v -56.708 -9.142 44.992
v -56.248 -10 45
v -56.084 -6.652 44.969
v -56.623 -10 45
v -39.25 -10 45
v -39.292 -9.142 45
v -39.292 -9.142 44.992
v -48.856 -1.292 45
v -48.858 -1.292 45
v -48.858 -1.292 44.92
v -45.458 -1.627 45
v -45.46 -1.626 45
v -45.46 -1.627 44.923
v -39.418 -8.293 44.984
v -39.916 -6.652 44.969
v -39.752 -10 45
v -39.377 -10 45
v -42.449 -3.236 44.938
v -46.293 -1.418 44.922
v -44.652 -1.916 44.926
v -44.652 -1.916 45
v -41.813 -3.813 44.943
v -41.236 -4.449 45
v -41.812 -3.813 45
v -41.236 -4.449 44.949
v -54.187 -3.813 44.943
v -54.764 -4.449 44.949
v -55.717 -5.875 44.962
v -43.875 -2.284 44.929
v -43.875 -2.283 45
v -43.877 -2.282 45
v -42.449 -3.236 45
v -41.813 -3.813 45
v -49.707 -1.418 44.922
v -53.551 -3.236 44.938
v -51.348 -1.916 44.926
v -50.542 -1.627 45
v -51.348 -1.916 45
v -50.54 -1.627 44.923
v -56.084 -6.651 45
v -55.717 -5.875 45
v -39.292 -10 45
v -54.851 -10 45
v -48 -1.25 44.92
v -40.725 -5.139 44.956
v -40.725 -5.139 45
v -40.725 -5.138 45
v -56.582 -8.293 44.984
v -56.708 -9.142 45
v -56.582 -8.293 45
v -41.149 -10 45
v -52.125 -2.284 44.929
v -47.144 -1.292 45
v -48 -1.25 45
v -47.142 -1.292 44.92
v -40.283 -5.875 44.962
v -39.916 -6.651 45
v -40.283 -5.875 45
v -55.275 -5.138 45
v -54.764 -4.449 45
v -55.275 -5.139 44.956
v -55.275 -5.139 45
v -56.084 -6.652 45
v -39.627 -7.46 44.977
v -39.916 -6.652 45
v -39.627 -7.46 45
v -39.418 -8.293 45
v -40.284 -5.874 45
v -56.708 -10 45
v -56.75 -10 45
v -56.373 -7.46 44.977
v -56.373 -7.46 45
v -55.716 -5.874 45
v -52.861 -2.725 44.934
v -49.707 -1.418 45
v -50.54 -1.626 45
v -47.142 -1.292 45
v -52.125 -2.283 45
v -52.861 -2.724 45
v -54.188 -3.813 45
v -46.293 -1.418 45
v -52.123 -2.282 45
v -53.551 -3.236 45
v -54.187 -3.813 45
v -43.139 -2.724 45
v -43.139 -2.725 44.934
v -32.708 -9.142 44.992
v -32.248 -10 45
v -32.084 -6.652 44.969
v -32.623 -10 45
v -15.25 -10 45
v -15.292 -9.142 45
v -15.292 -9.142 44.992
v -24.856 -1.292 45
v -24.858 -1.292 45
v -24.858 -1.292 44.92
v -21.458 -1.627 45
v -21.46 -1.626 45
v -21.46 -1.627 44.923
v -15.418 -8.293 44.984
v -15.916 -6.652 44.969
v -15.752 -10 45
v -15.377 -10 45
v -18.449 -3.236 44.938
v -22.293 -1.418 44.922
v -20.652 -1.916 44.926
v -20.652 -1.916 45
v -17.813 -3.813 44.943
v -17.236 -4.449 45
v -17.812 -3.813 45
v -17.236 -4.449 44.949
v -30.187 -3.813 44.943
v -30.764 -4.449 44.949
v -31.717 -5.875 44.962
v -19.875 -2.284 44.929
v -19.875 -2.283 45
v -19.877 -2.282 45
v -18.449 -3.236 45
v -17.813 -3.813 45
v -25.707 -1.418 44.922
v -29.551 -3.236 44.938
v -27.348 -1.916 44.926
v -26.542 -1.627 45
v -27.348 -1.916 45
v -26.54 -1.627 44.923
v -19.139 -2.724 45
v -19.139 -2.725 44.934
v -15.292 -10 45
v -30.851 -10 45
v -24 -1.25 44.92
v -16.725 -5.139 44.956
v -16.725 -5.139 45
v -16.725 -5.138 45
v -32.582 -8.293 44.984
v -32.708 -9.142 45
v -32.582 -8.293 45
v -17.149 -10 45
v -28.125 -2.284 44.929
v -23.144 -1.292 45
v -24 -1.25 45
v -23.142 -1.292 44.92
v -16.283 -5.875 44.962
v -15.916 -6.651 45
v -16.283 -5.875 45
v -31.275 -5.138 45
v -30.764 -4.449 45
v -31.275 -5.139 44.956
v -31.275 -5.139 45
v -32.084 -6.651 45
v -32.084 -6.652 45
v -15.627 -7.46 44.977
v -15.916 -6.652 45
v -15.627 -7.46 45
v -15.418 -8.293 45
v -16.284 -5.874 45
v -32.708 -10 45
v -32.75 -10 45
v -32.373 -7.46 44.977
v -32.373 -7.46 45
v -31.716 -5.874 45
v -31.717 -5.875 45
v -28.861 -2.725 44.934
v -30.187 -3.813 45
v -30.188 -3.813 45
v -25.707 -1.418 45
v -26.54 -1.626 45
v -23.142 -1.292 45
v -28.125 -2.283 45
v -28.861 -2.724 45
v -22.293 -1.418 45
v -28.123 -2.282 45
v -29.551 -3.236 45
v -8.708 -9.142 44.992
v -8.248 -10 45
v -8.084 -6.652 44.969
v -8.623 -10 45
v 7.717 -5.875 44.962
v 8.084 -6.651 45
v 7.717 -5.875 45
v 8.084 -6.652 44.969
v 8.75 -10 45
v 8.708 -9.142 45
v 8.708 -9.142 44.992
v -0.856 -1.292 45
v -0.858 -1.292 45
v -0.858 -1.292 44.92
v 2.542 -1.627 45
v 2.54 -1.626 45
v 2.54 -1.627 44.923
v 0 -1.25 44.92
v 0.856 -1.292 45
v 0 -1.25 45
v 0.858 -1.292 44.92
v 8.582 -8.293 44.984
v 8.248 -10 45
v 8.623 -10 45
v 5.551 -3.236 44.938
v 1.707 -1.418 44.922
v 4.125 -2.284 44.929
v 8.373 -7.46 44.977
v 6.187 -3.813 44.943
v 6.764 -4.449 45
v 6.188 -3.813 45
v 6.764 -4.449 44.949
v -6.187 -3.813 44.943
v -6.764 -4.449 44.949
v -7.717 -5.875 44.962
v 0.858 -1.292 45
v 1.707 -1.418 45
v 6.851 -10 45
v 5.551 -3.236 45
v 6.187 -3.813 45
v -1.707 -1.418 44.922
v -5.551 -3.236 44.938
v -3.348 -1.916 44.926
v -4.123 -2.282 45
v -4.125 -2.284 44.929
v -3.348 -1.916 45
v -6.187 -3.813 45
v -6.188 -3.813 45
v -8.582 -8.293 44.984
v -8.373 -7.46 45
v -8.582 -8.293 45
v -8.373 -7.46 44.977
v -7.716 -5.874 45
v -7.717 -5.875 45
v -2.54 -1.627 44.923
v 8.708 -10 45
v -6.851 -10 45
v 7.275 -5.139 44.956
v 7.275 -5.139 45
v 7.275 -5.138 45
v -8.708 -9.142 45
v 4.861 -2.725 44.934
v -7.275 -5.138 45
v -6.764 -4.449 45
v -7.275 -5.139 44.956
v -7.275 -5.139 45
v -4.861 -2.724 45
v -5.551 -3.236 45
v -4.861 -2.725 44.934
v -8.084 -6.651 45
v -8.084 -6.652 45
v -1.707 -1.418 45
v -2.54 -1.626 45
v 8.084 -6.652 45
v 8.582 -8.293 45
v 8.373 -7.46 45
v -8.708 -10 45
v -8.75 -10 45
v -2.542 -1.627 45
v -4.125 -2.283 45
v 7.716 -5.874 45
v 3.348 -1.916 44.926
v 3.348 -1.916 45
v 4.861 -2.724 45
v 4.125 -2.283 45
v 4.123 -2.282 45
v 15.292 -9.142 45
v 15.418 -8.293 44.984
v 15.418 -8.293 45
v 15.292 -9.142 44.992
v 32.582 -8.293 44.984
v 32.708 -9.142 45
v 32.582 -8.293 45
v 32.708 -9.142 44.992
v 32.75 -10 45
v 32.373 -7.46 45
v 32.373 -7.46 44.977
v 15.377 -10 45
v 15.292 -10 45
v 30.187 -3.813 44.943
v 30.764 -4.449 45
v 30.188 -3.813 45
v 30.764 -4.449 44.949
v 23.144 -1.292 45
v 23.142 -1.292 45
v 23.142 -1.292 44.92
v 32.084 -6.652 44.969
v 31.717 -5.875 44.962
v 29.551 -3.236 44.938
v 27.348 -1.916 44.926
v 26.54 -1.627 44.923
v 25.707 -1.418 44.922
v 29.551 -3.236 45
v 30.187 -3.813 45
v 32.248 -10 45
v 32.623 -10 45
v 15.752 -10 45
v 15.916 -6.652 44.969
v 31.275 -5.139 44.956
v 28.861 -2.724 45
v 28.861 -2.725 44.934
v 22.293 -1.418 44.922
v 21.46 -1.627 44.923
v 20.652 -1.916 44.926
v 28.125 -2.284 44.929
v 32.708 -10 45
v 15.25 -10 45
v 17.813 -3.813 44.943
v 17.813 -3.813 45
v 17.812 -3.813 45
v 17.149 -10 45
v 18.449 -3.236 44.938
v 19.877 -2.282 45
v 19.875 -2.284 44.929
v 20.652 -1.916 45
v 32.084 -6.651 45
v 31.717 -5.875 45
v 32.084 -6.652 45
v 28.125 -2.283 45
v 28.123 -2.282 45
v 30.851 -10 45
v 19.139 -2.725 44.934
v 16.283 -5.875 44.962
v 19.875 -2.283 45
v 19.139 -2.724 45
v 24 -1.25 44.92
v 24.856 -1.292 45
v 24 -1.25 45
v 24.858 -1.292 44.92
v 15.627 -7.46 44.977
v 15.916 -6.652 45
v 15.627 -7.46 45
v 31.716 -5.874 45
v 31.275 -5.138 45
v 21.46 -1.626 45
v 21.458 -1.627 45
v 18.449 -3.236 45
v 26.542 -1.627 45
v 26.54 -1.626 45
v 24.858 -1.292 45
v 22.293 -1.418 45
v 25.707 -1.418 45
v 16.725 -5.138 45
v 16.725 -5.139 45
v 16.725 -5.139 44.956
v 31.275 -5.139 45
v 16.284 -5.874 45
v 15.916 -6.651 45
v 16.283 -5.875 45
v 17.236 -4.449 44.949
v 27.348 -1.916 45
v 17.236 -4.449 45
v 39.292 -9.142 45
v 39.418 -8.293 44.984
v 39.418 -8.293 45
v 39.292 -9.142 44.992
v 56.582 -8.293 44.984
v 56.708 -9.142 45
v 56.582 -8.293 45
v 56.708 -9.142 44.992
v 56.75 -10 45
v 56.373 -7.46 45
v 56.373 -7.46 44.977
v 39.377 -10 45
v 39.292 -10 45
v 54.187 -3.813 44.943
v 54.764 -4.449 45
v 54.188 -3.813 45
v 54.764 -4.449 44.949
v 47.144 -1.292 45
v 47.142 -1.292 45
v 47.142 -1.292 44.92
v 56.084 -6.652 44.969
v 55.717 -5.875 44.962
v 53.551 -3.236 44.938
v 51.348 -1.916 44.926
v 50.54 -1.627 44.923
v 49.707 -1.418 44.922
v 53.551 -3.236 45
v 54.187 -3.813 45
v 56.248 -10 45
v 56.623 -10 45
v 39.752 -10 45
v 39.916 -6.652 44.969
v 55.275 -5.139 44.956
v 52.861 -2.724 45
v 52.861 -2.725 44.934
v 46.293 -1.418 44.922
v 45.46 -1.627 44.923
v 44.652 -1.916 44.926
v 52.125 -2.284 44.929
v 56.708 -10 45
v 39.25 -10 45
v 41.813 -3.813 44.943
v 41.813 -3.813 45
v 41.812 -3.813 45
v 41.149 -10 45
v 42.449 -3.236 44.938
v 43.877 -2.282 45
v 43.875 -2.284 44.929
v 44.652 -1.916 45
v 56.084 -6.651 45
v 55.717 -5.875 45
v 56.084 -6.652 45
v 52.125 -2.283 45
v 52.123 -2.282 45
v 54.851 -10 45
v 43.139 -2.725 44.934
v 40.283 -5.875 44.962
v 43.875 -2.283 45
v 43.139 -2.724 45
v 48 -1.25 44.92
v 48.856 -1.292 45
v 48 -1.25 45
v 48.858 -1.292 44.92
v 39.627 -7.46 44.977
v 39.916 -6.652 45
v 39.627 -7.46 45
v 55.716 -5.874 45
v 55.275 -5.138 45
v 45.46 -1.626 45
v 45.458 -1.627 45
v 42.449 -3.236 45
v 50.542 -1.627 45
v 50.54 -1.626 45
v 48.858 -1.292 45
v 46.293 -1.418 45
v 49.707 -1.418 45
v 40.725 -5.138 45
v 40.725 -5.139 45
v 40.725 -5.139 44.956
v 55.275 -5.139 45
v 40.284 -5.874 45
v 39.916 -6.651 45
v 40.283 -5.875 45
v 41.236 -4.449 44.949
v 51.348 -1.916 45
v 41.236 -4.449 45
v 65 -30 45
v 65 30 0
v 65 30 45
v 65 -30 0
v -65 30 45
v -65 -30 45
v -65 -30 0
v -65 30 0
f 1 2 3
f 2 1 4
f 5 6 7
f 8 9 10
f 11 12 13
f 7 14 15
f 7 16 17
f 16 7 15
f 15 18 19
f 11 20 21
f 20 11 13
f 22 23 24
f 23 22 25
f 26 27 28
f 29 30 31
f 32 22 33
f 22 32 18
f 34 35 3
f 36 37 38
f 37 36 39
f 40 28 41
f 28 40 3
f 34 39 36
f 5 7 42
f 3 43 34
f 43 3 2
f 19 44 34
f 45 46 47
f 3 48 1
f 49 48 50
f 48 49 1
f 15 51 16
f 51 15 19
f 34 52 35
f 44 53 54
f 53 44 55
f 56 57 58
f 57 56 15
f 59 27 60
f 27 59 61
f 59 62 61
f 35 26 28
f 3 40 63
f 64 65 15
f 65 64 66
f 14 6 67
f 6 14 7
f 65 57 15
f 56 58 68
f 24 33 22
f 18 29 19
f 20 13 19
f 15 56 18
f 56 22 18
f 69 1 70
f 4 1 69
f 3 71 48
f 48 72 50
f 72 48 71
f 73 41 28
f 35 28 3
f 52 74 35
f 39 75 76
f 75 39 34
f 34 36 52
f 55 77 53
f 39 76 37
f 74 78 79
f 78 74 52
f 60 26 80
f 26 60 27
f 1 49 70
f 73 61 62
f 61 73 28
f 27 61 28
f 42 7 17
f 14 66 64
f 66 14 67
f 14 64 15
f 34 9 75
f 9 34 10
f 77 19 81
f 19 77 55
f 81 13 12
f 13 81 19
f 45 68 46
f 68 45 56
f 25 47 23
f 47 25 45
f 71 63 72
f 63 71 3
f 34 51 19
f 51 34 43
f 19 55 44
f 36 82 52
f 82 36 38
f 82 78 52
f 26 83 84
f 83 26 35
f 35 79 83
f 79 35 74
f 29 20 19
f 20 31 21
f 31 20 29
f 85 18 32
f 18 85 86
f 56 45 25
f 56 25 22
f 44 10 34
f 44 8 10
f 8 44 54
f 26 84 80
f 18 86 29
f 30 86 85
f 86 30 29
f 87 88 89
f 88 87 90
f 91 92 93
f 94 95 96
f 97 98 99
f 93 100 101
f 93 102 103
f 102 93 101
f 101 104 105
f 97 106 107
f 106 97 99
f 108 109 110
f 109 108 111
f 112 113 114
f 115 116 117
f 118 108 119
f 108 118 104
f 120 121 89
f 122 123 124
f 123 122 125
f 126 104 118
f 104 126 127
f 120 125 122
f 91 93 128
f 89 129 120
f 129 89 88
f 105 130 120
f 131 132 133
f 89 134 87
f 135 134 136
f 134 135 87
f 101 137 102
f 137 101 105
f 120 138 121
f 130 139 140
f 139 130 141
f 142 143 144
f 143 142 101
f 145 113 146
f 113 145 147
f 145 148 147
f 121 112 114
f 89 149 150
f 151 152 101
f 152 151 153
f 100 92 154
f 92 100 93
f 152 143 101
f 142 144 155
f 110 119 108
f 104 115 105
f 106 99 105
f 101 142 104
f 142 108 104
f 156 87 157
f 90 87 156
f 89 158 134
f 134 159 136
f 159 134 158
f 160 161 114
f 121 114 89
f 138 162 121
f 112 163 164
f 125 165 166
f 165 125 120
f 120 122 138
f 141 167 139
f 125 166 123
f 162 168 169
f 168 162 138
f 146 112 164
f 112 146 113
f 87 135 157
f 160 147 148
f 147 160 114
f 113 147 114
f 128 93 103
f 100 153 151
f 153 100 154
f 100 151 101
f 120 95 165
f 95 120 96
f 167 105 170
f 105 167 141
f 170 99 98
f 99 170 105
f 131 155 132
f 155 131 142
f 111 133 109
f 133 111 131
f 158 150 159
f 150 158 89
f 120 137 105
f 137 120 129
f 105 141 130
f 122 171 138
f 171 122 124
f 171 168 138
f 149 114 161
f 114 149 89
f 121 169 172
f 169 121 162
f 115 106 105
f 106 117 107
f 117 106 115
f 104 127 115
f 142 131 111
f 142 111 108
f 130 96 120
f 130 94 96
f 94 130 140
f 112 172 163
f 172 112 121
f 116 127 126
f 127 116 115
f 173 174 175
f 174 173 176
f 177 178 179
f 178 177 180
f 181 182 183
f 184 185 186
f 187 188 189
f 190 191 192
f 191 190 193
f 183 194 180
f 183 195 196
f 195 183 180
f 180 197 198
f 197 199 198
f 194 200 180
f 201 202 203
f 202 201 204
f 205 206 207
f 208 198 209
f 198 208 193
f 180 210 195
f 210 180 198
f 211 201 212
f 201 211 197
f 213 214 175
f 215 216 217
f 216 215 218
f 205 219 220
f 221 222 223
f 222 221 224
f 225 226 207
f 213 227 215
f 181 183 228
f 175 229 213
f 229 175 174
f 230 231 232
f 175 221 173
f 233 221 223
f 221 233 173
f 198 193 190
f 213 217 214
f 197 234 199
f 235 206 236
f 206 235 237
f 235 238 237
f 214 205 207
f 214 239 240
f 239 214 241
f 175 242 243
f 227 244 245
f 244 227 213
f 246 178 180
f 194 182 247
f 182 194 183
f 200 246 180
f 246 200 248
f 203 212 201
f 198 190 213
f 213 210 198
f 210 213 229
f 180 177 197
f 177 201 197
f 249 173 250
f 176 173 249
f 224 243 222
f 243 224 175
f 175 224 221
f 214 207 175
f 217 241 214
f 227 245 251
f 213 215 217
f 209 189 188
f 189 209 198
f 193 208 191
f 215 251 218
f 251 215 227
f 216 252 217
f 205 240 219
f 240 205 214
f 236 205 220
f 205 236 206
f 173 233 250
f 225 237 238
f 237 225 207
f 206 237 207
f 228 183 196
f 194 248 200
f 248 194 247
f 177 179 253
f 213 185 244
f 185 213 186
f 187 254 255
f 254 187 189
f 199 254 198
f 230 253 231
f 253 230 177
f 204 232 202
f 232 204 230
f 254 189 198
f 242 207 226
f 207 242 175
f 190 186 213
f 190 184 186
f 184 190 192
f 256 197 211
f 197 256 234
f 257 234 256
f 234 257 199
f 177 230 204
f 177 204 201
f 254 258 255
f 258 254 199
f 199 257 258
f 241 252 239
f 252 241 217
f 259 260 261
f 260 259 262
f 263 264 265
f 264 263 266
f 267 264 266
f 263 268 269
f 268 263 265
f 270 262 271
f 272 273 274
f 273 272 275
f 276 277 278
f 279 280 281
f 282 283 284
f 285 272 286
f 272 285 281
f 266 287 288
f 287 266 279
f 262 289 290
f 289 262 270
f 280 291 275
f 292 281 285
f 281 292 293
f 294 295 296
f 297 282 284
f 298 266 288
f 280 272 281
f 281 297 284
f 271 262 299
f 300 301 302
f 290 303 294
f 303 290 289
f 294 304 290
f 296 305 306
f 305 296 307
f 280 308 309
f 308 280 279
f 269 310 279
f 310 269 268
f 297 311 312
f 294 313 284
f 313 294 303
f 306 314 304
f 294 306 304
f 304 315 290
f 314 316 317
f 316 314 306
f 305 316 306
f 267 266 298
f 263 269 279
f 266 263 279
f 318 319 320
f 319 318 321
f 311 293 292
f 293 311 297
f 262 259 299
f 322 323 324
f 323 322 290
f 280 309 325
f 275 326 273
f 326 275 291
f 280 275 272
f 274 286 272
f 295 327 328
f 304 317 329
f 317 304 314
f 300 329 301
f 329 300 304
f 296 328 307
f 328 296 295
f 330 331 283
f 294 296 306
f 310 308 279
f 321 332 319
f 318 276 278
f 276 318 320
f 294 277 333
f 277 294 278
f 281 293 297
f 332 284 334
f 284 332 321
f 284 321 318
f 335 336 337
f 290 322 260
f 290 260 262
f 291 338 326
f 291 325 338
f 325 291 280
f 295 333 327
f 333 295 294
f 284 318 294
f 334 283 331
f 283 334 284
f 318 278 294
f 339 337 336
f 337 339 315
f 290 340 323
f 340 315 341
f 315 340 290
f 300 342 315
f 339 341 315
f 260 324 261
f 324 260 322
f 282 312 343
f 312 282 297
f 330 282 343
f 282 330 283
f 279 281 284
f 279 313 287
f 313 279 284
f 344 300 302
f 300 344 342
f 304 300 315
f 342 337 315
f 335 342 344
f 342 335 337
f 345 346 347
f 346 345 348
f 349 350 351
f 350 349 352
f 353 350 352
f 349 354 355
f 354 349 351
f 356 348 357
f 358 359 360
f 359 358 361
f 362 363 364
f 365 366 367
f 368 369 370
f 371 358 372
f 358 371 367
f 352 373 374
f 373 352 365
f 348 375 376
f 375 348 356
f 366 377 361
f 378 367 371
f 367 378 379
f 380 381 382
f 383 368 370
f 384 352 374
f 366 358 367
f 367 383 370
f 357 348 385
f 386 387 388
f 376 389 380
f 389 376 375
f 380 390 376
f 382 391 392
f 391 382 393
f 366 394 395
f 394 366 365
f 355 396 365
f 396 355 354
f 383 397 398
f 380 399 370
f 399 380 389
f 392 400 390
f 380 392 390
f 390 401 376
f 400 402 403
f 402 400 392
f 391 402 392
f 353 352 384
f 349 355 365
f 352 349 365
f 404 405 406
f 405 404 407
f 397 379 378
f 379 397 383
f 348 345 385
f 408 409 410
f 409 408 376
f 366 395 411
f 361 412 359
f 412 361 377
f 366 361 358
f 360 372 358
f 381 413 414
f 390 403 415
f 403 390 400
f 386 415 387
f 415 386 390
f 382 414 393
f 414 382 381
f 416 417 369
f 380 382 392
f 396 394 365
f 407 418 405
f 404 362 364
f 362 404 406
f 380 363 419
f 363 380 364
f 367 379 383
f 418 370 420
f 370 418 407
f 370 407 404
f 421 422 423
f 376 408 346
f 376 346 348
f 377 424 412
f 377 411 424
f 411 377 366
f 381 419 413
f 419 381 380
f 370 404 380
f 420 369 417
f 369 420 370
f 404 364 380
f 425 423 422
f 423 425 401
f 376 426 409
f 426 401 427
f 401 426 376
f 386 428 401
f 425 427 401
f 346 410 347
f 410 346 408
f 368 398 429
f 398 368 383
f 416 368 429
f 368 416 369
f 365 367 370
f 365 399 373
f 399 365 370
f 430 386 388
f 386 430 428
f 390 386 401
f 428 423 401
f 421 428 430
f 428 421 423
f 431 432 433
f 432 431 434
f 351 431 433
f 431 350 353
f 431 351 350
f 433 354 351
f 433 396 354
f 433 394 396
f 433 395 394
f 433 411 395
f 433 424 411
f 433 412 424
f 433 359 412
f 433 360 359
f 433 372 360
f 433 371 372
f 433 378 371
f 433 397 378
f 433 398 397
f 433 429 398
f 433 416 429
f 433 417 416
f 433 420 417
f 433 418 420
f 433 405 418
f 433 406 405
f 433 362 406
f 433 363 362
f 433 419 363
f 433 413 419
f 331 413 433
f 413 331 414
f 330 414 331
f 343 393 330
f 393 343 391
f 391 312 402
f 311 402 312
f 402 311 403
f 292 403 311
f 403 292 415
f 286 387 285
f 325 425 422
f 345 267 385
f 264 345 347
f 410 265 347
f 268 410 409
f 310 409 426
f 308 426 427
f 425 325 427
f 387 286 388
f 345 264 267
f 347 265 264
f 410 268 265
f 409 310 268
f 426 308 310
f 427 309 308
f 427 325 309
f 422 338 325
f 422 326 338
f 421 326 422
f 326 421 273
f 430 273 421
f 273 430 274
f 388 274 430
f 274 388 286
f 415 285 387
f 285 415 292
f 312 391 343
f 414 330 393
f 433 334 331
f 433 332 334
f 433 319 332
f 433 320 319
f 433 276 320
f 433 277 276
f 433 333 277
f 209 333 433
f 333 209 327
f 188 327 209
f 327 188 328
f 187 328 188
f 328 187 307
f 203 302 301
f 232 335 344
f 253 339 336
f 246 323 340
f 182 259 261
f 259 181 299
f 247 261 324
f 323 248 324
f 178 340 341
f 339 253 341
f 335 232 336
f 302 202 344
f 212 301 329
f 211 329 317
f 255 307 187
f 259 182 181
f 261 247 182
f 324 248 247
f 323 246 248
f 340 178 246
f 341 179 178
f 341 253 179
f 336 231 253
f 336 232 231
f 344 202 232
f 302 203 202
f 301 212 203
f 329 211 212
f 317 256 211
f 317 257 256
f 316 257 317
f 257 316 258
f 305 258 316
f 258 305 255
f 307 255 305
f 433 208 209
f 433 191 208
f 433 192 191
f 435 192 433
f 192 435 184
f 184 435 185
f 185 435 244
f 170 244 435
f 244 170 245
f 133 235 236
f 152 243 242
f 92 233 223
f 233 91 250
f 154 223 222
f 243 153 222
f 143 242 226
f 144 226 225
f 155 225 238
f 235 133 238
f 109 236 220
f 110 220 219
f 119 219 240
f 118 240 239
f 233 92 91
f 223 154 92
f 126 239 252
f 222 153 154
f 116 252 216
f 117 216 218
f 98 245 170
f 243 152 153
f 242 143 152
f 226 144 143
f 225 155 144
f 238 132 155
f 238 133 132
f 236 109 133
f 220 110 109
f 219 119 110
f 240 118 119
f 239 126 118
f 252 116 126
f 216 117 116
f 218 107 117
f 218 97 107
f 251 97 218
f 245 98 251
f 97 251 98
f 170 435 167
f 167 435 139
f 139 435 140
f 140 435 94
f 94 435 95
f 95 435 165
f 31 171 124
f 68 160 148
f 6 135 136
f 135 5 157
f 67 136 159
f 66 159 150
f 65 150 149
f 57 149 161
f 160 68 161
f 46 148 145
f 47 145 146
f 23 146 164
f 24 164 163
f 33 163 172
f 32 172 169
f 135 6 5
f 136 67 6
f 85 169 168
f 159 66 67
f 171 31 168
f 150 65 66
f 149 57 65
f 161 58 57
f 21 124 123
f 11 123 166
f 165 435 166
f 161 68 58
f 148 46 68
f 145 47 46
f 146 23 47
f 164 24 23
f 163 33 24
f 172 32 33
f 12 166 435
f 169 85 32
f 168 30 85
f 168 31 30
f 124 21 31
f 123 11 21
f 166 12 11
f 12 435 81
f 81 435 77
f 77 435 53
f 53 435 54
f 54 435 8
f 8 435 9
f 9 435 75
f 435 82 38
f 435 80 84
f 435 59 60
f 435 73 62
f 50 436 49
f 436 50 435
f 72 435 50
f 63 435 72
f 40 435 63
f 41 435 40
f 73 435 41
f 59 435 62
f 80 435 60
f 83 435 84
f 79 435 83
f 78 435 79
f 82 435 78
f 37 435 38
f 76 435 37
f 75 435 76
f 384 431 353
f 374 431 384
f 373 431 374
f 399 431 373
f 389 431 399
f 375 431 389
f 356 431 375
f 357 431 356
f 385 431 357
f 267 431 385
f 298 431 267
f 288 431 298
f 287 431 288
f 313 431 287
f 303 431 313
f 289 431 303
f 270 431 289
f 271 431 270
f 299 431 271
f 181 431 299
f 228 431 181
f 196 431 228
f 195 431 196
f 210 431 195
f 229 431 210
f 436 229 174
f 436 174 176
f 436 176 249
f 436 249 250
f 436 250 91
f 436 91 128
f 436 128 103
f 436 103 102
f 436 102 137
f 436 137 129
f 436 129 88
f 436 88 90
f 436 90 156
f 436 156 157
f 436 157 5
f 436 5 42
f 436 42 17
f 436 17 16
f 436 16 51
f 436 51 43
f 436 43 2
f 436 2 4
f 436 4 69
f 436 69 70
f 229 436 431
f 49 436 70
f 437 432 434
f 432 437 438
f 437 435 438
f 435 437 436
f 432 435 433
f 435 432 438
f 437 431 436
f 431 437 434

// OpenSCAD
// --- Dimensions ---
block_x = 130;           // Length of the block (X)
block_y = 60;            // Depth of the block (Y)
block_z = 45;            // Height of the block (Z)

num_holes = 5;           // Number of tube holes
hole_spacing = 24;       // Distance between hole centers (X)
hole_diameter = 17.5;    // Diameter of the holes
hole_depth = 40;         // Depth of the holes along their axis

tilt_angle = 30;         // Tilt angle from vertical (degrees)
tilt_y_offset = -10;     // Y-coordinate where the hole axis meets the top face

// --- Constants ---
$fn = 64;                // Smoothness for cylinders
eps = 0.1;               // Small offset for boolean operations

// --- Calculations ---
// Calculate the starting X positions to center the grid of holes
// The total span of holes is (num_holes - 1) * hole_spacing
hole_span = (num_holes - 1) * hole_spacing;
start_x = -(hole_span / 2);

// Convert angle to radians for math functions
// The problem states: "tilted 30 degrees from vertical... moving toward +Y"
// This means the axis vector in YZ plane is (0, sin(30), -cos(30))
angle_rad = tilt_angle * PI / 180;

// --- Main Model ---
difference() {
    // The main block
    translate([-block_x/2, -block_y/2, 0])
        cube([block_x, block_y, block_z]);

    // The five blind holes
    for (i = [0 : num_holes - 1]) {
        // Calculate X position for this hole
        current_x = start_x + (i * hole_spacing);
        
        // The hole axis starts at the top face (Z = block_z)
        // and moves down and towards +Y.
        // We use a cylinder and rotate it.
        // To tilt "toward +Y" while going "down", the rotation is around X axis.
        // A positive rotation around X moves +Y towards +Z. 
        // We want +Y towards -Z. So we rotate by -30 degrees or 30 degrees depending on axis.
        // Let's define the rotation: 
        // If we rotate the Z-axis around the X-axis by 'angle', 
        // the new Z vector is (0, sin(angle), cos(angle)).
        // We want the hole to go DOWN (-Z) and TOWARDS +Y.
        // So we rotate by -30 degrees (or 330) around X.
        
        translate([current_x, tilt_y_offset, block_z])
            rotate([-angle_rad, 0, 0]) // Rotate around X to tilt in YZ plane
                cylinder(h = hole_depth + eps, d = hole_diameter, center = false);
                
        // Note: The cylinder is drawn from Z=block_z downwards. 
        // To ensure it is a "blind hole" with a flat end, we actually need to 
        // make sure the cylinder is oriented correctly.
        // Let's redefine the hole placement for clarity:
    }
}

// Re-writing the hole logic to be more robust for "blind holes"
// We will use a union of the block and then subtract the holes.
// To make the holes "blind" and "flat at the bottom", we subtract 
// a cylinder that starts at the top and ends at the required depth.

// Corrected Hole Logic:
// 1. Start at top face (Z = block_z)
// 2. Tilt 30 degrees towards +Y (Rotation around X axis)
// 3. Depth is 40mm.

// Let's clear the previous difference and do it properly:
// (The code below replaces the logic inside the difference block)

/* 
// REVISED LOGIC FOR THE DIFFERENCE BLOCK:
difference() {
    // The main block
    translate([-block_x/2, -block_y/2, 0])
        cube([block_x, block_y, block_z]);

    // The five blind holes
    for (i = [0 : num_holes - 1]) {
        current_x = start_x + (i * hole_spacing);
        
        // We place the cylinder at the top face.
        // To tilt towards +Y as it goes down, we rotate around X.
        // A rotation of +30 degrees around X: 
        // New Y = Z_old * sin(30)
        // New Z = Z_old * cos(30)
        // Since we want Z to decrease, we rotate by -30 degrees.
        
        translate([current_x, tilt_y_offset, block_z])
            rotate([-angle_rad, 0, 0])
                cylinder(h = hole_depth + eps, d = hole_diameter);
    }
}
*/

// Final implementation (Cleaned up)
module block() {
    translate([-block_x/2, -block_y/2, 0])
        cube([block_x, block_y, block_z]);
}

module holes() {
    for (i = [0 : num_holes - 1]) {
        current_x = start_x + (i * hole_spacing);
        // The cylinder is placed at the top face.
        // We rotate it around the X axis to tilt it in the YZ plane.
        // To tilt towards +Y as it goes down, we rotate by -30 degrees.
        translate([current_x, tilt_y_offset, block_z])
            rotate([-angle_rad, 0, 0])
                cylinder(h = hole_depth + eps, d = hole_diameter);
    }
}

// Final assembly
difference() {
    block();
    holes();
}
